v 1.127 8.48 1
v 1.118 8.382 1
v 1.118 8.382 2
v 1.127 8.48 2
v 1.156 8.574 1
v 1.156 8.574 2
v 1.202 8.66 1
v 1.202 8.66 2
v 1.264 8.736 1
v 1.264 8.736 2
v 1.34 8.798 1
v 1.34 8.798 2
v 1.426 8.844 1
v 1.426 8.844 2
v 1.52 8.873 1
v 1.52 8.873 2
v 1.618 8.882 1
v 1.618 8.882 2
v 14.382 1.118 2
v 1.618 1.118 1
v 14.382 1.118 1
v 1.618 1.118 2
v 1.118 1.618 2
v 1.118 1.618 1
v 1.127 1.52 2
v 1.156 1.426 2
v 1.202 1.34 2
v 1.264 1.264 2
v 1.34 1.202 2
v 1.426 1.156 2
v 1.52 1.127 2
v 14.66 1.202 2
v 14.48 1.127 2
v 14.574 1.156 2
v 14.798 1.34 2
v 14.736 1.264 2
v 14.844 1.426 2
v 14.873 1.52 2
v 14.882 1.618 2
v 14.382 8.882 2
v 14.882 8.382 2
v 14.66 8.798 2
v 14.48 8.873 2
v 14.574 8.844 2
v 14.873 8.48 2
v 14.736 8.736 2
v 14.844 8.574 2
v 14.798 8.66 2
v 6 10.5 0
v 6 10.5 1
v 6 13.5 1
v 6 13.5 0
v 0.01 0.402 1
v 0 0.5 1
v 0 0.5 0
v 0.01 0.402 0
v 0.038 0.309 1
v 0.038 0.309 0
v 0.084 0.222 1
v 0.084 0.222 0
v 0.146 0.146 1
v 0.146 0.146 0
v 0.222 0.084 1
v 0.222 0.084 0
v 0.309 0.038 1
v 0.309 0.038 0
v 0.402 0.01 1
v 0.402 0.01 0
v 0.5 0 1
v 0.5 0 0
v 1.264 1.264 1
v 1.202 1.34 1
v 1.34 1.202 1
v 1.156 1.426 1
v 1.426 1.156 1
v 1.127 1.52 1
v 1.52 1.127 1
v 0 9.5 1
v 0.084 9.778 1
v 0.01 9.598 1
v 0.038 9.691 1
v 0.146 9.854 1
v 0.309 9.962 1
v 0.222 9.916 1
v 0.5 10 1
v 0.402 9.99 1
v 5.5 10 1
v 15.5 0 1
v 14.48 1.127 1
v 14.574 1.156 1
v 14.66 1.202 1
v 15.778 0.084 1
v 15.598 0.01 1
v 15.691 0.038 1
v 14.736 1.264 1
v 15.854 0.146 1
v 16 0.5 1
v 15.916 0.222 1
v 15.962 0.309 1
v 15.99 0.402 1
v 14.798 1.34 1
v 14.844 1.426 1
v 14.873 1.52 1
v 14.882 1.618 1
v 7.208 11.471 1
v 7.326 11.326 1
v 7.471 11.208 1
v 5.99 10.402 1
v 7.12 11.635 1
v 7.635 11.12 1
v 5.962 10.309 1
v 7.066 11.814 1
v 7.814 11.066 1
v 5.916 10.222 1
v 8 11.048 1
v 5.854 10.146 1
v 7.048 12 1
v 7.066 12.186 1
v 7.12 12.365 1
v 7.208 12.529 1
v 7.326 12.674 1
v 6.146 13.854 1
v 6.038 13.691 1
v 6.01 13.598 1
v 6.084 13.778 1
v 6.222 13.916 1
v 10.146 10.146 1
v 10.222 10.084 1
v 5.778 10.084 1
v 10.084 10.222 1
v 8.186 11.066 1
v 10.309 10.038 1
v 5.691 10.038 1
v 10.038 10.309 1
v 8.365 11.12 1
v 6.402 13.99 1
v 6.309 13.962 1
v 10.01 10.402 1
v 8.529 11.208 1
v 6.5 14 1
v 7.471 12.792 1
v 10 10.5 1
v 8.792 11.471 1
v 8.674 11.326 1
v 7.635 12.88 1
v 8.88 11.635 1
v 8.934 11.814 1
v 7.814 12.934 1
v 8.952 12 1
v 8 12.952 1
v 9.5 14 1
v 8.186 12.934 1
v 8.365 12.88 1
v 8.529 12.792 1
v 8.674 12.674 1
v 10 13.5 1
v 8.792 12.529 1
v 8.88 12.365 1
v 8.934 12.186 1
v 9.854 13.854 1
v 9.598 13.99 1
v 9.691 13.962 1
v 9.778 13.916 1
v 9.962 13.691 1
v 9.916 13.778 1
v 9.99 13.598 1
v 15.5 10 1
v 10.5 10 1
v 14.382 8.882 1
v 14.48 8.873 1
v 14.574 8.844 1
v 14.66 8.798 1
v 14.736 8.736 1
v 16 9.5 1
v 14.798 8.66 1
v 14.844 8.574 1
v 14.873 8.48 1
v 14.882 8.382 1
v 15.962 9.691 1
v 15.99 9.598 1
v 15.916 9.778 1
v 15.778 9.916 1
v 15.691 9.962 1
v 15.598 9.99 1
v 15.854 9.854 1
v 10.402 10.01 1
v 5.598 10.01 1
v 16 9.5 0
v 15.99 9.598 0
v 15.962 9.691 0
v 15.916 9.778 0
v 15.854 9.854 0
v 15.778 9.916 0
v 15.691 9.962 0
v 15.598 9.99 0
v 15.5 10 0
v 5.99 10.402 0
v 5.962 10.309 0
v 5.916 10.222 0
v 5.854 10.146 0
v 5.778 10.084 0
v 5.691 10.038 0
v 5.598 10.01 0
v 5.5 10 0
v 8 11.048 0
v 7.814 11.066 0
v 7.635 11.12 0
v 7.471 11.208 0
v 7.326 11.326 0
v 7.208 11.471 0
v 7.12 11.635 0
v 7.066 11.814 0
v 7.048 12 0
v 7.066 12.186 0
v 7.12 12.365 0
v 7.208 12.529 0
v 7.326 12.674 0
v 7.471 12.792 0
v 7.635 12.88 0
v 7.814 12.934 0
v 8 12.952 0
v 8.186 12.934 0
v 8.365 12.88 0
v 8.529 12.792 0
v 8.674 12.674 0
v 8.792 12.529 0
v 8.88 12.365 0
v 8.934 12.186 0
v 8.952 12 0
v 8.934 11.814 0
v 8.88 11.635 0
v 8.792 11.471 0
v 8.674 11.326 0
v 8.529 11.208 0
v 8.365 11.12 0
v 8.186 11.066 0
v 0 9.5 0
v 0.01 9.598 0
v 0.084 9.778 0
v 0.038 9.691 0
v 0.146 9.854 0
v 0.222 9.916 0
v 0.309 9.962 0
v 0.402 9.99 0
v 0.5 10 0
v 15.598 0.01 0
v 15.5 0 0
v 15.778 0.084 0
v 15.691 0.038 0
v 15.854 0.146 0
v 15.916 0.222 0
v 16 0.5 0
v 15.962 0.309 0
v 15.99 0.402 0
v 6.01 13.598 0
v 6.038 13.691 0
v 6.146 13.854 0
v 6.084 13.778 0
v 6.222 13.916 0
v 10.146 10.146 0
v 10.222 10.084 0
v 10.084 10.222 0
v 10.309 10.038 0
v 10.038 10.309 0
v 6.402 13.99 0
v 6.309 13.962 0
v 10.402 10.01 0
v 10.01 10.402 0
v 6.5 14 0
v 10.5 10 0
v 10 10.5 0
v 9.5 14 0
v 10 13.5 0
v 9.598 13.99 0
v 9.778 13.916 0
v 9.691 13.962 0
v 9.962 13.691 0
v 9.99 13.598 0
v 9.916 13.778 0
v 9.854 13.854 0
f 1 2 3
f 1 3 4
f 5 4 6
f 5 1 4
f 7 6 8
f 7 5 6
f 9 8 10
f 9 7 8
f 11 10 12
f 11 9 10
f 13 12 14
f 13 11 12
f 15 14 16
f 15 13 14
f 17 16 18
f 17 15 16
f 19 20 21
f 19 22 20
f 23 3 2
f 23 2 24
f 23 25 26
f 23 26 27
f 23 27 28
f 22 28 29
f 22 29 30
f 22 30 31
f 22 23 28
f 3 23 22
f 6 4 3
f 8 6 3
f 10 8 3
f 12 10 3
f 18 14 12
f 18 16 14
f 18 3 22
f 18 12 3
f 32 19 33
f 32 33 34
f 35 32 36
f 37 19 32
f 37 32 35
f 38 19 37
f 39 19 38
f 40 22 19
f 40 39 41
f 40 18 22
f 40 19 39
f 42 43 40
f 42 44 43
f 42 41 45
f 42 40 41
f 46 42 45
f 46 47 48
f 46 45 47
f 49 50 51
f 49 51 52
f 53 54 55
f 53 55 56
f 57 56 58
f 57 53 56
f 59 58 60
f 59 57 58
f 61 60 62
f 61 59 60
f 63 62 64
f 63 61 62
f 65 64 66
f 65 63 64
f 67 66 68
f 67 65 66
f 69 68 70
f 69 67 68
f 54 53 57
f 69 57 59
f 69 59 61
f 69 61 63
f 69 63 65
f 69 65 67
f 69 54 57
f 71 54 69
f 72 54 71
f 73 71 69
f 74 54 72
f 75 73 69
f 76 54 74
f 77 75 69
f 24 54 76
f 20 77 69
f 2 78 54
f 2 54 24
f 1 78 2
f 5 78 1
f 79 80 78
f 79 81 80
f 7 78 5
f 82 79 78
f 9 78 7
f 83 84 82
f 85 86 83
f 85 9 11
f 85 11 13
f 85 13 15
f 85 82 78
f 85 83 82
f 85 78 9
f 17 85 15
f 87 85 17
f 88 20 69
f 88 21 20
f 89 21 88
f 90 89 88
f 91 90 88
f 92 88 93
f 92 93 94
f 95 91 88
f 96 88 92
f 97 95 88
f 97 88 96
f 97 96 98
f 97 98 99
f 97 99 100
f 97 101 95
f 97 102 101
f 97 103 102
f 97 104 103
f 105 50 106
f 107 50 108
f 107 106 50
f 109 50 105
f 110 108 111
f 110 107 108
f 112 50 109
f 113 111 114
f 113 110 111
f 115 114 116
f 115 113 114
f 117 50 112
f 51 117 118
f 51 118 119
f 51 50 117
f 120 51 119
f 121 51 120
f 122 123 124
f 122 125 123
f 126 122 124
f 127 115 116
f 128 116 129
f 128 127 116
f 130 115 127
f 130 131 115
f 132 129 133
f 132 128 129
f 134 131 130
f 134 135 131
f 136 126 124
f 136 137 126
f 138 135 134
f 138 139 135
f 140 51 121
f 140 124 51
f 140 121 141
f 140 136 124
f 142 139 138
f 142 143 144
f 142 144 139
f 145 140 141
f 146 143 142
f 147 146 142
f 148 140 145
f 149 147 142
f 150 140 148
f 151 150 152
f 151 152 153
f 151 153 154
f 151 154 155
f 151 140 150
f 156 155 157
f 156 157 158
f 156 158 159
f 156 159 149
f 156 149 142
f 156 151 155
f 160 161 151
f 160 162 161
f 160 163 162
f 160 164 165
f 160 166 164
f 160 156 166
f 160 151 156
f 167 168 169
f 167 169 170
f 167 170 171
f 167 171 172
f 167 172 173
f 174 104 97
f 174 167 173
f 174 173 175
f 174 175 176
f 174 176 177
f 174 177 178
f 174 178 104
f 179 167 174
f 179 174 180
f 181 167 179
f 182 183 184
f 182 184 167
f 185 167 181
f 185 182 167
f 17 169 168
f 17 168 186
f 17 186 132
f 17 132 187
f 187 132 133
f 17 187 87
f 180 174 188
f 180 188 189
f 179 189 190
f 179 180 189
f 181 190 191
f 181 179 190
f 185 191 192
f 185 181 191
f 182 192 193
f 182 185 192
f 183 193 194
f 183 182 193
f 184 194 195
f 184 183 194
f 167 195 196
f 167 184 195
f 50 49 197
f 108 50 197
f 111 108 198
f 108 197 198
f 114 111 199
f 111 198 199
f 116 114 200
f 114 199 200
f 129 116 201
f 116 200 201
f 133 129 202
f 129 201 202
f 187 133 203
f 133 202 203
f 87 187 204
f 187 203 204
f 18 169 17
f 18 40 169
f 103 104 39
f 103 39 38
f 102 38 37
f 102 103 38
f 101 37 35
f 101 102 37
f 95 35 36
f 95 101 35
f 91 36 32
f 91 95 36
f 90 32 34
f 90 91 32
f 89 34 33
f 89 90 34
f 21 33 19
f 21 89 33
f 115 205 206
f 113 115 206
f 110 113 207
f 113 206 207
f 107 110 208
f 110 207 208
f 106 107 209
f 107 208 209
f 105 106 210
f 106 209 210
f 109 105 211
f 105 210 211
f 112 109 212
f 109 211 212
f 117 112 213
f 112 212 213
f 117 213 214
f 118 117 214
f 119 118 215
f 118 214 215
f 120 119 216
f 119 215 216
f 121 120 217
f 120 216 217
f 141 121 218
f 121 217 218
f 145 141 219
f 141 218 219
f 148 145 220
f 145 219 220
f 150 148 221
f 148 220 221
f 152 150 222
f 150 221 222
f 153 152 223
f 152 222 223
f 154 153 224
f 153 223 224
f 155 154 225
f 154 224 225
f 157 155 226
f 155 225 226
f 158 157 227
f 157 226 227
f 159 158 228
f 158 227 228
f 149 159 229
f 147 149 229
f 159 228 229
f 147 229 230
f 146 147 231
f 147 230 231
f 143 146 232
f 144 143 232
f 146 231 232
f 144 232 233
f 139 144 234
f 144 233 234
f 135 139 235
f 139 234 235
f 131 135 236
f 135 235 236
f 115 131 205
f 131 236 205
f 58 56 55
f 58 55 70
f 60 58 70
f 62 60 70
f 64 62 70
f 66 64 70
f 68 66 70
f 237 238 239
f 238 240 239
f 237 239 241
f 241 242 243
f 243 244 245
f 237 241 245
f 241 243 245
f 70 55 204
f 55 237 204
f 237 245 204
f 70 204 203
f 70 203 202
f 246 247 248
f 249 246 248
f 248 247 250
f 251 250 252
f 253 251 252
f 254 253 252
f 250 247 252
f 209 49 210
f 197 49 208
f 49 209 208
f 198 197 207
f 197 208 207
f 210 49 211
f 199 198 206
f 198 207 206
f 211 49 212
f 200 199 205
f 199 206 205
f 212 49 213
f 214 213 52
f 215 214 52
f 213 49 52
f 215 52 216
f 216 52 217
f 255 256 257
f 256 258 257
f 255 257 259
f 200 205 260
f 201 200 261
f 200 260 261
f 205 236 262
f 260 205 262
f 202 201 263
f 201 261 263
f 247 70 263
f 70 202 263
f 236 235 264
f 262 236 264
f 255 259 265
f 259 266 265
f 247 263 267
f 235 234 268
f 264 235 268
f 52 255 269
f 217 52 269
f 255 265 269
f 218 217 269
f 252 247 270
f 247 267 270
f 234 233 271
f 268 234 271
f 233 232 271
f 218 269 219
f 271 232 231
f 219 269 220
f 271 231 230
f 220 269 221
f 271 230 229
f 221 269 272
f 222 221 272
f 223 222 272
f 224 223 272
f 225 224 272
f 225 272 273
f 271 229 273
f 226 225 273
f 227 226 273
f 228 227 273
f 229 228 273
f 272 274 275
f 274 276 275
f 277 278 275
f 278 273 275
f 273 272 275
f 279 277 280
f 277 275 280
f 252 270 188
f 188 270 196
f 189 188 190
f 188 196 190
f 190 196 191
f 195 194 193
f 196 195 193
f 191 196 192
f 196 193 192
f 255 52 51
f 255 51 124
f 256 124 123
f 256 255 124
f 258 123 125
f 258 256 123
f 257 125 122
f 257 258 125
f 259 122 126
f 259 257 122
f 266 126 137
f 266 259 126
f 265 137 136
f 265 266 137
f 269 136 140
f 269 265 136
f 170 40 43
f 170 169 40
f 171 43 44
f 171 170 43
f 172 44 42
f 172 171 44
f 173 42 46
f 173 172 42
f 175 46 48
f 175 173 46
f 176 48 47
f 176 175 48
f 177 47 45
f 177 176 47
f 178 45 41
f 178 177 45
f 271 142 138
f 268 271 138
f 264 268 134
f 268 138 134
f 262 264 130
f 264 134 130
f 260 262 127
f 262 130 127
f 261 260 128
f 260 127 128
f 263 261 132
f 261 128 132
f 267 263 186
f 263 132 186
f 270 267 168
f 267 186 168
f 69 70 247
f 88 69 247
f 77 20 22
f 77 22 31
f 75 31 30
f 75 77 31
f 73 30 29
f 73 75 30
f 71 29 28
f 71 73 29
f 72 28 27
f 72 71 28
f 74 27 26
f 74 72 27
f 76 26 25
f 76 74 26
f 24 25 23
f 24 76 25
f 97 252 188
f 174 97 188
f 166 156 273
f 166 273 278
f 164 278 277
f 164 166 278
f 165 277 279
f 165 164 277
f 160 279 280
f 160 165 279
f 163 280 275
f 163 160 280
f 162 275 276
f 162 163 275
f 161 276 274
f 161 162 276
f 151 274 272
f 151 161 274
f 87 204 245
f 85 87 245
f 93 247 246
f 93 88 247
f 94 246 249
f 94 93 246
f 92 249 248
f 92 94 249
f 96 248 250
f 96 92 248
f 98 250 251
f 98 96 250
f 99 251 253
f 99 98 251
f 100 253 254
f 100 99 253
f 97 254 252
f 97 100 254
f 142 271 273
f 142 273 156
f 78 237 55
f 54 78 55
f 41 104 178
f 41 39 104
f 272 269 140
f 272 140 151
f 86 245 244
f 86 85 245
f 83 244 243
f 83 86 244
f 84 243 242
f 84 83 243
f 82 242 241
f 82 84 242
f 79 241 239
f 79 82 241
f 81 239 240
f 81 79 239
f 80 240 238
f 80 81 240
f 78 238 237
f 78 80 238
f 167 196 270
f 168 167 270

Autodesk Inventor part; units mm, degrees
ref_plane "YZ Plane" through (0, 0, 0) normal (1, 0, 0) x (0, 1, 0)
ref_plane "XZ Plane" through (0, 0, 0) normal (0, 1, 0) x (-1, 0, 0)
ref_plane "XY Plane" through (0, 0, 0) normal (0, 0, 1) x (1, 0, 0)
sketch "Sketch1" plane through (0, 0, 0) normal (0, 0, 1) x (1, 0, 0)
  line L0 (0, 0) -> (16, 0)
  line L1 (16, 0) -> (16, 10)
  line L2 (16, 10) -> (0, 10)
  line L3 (0, 10) -> (0, 0)
  dimension "d0" = 16
  dimension "d1" = 10
extrude "Extrusion1" add sketch "Sketch1" along normal blind 2
sketch "Sketch2" plane through (0, 0, 2) normal (0, 0, 1) x (1, 0, 0)
  line L0 (0, 0) -> (0, 10) projected
  line L1 (16, 0) -> (0, 0) projected
  line L2 (16, 10) -> (16, 0) projected
  line L3 (0, 10) -> (16, 10) projected
  line L4 (1.1176, 8.8824) -> (1.1176, 1.1176)
  line L5 (1.1176, 1.1176) -> (14.8824, 1.1176)
  line L6 (14.8824, 1.1176) -> (14.8824, 8.8824)
  line L7 (14.8824, 8.8824) -> (1.1176, 8.8824)
  dimension "d4" = 1.1176
extrude "Extrusion2" cut sketch "Sketch2" against normal blind 1
sketch "Sketch3" plane through (0, 10, 0) normal (0, 1, 0) x (1, 0, 0)
  line L0 (0, -1) -> (16, -1) projected
  line L1 (16, 0) -> (0, 0) projected
  line L2 (0, 0) -> (0, -1) projected
  line L3 (6, 0) -> (10, 0)
  line L4 (10, 0) -> (10, -1)
  line L5 (10, -1) -> (6, -1)
  line L6 (6, -1) -> (6, 0)
  dimension "d7" = 4
  dimension "d8" = 6
extrude "Extrusion3" add sketch "Sketch3" along normal blind 4 contours L6 L1 L4 L0
sketch "Sketch4" plane through (0, 0, 1) normal (0, 0, 1) x (1, 0, 0)
  point P0 (8, 12)
hole "Hole1" at (8, 12, 1) direction (0, 0, -1) diameter 1.905 end through all
fillet "Fillet1" radius 0.5 12 edges at (1.1176, 1.1176, 1.5) (0, 0, 0.5) (1.1176, 8.8824, 1.5) (0, 10, 0.5) (14.8824, 1.1176, 1.5) (16, 0, 0.5) (14.8824, 8.8824, 1.5) (16, 10, 0.5) (10, 10, 0.5) (6, 10, 0.5) (6, 14, 0.5) (10, 14, 0.5)
properties part number "lid"
